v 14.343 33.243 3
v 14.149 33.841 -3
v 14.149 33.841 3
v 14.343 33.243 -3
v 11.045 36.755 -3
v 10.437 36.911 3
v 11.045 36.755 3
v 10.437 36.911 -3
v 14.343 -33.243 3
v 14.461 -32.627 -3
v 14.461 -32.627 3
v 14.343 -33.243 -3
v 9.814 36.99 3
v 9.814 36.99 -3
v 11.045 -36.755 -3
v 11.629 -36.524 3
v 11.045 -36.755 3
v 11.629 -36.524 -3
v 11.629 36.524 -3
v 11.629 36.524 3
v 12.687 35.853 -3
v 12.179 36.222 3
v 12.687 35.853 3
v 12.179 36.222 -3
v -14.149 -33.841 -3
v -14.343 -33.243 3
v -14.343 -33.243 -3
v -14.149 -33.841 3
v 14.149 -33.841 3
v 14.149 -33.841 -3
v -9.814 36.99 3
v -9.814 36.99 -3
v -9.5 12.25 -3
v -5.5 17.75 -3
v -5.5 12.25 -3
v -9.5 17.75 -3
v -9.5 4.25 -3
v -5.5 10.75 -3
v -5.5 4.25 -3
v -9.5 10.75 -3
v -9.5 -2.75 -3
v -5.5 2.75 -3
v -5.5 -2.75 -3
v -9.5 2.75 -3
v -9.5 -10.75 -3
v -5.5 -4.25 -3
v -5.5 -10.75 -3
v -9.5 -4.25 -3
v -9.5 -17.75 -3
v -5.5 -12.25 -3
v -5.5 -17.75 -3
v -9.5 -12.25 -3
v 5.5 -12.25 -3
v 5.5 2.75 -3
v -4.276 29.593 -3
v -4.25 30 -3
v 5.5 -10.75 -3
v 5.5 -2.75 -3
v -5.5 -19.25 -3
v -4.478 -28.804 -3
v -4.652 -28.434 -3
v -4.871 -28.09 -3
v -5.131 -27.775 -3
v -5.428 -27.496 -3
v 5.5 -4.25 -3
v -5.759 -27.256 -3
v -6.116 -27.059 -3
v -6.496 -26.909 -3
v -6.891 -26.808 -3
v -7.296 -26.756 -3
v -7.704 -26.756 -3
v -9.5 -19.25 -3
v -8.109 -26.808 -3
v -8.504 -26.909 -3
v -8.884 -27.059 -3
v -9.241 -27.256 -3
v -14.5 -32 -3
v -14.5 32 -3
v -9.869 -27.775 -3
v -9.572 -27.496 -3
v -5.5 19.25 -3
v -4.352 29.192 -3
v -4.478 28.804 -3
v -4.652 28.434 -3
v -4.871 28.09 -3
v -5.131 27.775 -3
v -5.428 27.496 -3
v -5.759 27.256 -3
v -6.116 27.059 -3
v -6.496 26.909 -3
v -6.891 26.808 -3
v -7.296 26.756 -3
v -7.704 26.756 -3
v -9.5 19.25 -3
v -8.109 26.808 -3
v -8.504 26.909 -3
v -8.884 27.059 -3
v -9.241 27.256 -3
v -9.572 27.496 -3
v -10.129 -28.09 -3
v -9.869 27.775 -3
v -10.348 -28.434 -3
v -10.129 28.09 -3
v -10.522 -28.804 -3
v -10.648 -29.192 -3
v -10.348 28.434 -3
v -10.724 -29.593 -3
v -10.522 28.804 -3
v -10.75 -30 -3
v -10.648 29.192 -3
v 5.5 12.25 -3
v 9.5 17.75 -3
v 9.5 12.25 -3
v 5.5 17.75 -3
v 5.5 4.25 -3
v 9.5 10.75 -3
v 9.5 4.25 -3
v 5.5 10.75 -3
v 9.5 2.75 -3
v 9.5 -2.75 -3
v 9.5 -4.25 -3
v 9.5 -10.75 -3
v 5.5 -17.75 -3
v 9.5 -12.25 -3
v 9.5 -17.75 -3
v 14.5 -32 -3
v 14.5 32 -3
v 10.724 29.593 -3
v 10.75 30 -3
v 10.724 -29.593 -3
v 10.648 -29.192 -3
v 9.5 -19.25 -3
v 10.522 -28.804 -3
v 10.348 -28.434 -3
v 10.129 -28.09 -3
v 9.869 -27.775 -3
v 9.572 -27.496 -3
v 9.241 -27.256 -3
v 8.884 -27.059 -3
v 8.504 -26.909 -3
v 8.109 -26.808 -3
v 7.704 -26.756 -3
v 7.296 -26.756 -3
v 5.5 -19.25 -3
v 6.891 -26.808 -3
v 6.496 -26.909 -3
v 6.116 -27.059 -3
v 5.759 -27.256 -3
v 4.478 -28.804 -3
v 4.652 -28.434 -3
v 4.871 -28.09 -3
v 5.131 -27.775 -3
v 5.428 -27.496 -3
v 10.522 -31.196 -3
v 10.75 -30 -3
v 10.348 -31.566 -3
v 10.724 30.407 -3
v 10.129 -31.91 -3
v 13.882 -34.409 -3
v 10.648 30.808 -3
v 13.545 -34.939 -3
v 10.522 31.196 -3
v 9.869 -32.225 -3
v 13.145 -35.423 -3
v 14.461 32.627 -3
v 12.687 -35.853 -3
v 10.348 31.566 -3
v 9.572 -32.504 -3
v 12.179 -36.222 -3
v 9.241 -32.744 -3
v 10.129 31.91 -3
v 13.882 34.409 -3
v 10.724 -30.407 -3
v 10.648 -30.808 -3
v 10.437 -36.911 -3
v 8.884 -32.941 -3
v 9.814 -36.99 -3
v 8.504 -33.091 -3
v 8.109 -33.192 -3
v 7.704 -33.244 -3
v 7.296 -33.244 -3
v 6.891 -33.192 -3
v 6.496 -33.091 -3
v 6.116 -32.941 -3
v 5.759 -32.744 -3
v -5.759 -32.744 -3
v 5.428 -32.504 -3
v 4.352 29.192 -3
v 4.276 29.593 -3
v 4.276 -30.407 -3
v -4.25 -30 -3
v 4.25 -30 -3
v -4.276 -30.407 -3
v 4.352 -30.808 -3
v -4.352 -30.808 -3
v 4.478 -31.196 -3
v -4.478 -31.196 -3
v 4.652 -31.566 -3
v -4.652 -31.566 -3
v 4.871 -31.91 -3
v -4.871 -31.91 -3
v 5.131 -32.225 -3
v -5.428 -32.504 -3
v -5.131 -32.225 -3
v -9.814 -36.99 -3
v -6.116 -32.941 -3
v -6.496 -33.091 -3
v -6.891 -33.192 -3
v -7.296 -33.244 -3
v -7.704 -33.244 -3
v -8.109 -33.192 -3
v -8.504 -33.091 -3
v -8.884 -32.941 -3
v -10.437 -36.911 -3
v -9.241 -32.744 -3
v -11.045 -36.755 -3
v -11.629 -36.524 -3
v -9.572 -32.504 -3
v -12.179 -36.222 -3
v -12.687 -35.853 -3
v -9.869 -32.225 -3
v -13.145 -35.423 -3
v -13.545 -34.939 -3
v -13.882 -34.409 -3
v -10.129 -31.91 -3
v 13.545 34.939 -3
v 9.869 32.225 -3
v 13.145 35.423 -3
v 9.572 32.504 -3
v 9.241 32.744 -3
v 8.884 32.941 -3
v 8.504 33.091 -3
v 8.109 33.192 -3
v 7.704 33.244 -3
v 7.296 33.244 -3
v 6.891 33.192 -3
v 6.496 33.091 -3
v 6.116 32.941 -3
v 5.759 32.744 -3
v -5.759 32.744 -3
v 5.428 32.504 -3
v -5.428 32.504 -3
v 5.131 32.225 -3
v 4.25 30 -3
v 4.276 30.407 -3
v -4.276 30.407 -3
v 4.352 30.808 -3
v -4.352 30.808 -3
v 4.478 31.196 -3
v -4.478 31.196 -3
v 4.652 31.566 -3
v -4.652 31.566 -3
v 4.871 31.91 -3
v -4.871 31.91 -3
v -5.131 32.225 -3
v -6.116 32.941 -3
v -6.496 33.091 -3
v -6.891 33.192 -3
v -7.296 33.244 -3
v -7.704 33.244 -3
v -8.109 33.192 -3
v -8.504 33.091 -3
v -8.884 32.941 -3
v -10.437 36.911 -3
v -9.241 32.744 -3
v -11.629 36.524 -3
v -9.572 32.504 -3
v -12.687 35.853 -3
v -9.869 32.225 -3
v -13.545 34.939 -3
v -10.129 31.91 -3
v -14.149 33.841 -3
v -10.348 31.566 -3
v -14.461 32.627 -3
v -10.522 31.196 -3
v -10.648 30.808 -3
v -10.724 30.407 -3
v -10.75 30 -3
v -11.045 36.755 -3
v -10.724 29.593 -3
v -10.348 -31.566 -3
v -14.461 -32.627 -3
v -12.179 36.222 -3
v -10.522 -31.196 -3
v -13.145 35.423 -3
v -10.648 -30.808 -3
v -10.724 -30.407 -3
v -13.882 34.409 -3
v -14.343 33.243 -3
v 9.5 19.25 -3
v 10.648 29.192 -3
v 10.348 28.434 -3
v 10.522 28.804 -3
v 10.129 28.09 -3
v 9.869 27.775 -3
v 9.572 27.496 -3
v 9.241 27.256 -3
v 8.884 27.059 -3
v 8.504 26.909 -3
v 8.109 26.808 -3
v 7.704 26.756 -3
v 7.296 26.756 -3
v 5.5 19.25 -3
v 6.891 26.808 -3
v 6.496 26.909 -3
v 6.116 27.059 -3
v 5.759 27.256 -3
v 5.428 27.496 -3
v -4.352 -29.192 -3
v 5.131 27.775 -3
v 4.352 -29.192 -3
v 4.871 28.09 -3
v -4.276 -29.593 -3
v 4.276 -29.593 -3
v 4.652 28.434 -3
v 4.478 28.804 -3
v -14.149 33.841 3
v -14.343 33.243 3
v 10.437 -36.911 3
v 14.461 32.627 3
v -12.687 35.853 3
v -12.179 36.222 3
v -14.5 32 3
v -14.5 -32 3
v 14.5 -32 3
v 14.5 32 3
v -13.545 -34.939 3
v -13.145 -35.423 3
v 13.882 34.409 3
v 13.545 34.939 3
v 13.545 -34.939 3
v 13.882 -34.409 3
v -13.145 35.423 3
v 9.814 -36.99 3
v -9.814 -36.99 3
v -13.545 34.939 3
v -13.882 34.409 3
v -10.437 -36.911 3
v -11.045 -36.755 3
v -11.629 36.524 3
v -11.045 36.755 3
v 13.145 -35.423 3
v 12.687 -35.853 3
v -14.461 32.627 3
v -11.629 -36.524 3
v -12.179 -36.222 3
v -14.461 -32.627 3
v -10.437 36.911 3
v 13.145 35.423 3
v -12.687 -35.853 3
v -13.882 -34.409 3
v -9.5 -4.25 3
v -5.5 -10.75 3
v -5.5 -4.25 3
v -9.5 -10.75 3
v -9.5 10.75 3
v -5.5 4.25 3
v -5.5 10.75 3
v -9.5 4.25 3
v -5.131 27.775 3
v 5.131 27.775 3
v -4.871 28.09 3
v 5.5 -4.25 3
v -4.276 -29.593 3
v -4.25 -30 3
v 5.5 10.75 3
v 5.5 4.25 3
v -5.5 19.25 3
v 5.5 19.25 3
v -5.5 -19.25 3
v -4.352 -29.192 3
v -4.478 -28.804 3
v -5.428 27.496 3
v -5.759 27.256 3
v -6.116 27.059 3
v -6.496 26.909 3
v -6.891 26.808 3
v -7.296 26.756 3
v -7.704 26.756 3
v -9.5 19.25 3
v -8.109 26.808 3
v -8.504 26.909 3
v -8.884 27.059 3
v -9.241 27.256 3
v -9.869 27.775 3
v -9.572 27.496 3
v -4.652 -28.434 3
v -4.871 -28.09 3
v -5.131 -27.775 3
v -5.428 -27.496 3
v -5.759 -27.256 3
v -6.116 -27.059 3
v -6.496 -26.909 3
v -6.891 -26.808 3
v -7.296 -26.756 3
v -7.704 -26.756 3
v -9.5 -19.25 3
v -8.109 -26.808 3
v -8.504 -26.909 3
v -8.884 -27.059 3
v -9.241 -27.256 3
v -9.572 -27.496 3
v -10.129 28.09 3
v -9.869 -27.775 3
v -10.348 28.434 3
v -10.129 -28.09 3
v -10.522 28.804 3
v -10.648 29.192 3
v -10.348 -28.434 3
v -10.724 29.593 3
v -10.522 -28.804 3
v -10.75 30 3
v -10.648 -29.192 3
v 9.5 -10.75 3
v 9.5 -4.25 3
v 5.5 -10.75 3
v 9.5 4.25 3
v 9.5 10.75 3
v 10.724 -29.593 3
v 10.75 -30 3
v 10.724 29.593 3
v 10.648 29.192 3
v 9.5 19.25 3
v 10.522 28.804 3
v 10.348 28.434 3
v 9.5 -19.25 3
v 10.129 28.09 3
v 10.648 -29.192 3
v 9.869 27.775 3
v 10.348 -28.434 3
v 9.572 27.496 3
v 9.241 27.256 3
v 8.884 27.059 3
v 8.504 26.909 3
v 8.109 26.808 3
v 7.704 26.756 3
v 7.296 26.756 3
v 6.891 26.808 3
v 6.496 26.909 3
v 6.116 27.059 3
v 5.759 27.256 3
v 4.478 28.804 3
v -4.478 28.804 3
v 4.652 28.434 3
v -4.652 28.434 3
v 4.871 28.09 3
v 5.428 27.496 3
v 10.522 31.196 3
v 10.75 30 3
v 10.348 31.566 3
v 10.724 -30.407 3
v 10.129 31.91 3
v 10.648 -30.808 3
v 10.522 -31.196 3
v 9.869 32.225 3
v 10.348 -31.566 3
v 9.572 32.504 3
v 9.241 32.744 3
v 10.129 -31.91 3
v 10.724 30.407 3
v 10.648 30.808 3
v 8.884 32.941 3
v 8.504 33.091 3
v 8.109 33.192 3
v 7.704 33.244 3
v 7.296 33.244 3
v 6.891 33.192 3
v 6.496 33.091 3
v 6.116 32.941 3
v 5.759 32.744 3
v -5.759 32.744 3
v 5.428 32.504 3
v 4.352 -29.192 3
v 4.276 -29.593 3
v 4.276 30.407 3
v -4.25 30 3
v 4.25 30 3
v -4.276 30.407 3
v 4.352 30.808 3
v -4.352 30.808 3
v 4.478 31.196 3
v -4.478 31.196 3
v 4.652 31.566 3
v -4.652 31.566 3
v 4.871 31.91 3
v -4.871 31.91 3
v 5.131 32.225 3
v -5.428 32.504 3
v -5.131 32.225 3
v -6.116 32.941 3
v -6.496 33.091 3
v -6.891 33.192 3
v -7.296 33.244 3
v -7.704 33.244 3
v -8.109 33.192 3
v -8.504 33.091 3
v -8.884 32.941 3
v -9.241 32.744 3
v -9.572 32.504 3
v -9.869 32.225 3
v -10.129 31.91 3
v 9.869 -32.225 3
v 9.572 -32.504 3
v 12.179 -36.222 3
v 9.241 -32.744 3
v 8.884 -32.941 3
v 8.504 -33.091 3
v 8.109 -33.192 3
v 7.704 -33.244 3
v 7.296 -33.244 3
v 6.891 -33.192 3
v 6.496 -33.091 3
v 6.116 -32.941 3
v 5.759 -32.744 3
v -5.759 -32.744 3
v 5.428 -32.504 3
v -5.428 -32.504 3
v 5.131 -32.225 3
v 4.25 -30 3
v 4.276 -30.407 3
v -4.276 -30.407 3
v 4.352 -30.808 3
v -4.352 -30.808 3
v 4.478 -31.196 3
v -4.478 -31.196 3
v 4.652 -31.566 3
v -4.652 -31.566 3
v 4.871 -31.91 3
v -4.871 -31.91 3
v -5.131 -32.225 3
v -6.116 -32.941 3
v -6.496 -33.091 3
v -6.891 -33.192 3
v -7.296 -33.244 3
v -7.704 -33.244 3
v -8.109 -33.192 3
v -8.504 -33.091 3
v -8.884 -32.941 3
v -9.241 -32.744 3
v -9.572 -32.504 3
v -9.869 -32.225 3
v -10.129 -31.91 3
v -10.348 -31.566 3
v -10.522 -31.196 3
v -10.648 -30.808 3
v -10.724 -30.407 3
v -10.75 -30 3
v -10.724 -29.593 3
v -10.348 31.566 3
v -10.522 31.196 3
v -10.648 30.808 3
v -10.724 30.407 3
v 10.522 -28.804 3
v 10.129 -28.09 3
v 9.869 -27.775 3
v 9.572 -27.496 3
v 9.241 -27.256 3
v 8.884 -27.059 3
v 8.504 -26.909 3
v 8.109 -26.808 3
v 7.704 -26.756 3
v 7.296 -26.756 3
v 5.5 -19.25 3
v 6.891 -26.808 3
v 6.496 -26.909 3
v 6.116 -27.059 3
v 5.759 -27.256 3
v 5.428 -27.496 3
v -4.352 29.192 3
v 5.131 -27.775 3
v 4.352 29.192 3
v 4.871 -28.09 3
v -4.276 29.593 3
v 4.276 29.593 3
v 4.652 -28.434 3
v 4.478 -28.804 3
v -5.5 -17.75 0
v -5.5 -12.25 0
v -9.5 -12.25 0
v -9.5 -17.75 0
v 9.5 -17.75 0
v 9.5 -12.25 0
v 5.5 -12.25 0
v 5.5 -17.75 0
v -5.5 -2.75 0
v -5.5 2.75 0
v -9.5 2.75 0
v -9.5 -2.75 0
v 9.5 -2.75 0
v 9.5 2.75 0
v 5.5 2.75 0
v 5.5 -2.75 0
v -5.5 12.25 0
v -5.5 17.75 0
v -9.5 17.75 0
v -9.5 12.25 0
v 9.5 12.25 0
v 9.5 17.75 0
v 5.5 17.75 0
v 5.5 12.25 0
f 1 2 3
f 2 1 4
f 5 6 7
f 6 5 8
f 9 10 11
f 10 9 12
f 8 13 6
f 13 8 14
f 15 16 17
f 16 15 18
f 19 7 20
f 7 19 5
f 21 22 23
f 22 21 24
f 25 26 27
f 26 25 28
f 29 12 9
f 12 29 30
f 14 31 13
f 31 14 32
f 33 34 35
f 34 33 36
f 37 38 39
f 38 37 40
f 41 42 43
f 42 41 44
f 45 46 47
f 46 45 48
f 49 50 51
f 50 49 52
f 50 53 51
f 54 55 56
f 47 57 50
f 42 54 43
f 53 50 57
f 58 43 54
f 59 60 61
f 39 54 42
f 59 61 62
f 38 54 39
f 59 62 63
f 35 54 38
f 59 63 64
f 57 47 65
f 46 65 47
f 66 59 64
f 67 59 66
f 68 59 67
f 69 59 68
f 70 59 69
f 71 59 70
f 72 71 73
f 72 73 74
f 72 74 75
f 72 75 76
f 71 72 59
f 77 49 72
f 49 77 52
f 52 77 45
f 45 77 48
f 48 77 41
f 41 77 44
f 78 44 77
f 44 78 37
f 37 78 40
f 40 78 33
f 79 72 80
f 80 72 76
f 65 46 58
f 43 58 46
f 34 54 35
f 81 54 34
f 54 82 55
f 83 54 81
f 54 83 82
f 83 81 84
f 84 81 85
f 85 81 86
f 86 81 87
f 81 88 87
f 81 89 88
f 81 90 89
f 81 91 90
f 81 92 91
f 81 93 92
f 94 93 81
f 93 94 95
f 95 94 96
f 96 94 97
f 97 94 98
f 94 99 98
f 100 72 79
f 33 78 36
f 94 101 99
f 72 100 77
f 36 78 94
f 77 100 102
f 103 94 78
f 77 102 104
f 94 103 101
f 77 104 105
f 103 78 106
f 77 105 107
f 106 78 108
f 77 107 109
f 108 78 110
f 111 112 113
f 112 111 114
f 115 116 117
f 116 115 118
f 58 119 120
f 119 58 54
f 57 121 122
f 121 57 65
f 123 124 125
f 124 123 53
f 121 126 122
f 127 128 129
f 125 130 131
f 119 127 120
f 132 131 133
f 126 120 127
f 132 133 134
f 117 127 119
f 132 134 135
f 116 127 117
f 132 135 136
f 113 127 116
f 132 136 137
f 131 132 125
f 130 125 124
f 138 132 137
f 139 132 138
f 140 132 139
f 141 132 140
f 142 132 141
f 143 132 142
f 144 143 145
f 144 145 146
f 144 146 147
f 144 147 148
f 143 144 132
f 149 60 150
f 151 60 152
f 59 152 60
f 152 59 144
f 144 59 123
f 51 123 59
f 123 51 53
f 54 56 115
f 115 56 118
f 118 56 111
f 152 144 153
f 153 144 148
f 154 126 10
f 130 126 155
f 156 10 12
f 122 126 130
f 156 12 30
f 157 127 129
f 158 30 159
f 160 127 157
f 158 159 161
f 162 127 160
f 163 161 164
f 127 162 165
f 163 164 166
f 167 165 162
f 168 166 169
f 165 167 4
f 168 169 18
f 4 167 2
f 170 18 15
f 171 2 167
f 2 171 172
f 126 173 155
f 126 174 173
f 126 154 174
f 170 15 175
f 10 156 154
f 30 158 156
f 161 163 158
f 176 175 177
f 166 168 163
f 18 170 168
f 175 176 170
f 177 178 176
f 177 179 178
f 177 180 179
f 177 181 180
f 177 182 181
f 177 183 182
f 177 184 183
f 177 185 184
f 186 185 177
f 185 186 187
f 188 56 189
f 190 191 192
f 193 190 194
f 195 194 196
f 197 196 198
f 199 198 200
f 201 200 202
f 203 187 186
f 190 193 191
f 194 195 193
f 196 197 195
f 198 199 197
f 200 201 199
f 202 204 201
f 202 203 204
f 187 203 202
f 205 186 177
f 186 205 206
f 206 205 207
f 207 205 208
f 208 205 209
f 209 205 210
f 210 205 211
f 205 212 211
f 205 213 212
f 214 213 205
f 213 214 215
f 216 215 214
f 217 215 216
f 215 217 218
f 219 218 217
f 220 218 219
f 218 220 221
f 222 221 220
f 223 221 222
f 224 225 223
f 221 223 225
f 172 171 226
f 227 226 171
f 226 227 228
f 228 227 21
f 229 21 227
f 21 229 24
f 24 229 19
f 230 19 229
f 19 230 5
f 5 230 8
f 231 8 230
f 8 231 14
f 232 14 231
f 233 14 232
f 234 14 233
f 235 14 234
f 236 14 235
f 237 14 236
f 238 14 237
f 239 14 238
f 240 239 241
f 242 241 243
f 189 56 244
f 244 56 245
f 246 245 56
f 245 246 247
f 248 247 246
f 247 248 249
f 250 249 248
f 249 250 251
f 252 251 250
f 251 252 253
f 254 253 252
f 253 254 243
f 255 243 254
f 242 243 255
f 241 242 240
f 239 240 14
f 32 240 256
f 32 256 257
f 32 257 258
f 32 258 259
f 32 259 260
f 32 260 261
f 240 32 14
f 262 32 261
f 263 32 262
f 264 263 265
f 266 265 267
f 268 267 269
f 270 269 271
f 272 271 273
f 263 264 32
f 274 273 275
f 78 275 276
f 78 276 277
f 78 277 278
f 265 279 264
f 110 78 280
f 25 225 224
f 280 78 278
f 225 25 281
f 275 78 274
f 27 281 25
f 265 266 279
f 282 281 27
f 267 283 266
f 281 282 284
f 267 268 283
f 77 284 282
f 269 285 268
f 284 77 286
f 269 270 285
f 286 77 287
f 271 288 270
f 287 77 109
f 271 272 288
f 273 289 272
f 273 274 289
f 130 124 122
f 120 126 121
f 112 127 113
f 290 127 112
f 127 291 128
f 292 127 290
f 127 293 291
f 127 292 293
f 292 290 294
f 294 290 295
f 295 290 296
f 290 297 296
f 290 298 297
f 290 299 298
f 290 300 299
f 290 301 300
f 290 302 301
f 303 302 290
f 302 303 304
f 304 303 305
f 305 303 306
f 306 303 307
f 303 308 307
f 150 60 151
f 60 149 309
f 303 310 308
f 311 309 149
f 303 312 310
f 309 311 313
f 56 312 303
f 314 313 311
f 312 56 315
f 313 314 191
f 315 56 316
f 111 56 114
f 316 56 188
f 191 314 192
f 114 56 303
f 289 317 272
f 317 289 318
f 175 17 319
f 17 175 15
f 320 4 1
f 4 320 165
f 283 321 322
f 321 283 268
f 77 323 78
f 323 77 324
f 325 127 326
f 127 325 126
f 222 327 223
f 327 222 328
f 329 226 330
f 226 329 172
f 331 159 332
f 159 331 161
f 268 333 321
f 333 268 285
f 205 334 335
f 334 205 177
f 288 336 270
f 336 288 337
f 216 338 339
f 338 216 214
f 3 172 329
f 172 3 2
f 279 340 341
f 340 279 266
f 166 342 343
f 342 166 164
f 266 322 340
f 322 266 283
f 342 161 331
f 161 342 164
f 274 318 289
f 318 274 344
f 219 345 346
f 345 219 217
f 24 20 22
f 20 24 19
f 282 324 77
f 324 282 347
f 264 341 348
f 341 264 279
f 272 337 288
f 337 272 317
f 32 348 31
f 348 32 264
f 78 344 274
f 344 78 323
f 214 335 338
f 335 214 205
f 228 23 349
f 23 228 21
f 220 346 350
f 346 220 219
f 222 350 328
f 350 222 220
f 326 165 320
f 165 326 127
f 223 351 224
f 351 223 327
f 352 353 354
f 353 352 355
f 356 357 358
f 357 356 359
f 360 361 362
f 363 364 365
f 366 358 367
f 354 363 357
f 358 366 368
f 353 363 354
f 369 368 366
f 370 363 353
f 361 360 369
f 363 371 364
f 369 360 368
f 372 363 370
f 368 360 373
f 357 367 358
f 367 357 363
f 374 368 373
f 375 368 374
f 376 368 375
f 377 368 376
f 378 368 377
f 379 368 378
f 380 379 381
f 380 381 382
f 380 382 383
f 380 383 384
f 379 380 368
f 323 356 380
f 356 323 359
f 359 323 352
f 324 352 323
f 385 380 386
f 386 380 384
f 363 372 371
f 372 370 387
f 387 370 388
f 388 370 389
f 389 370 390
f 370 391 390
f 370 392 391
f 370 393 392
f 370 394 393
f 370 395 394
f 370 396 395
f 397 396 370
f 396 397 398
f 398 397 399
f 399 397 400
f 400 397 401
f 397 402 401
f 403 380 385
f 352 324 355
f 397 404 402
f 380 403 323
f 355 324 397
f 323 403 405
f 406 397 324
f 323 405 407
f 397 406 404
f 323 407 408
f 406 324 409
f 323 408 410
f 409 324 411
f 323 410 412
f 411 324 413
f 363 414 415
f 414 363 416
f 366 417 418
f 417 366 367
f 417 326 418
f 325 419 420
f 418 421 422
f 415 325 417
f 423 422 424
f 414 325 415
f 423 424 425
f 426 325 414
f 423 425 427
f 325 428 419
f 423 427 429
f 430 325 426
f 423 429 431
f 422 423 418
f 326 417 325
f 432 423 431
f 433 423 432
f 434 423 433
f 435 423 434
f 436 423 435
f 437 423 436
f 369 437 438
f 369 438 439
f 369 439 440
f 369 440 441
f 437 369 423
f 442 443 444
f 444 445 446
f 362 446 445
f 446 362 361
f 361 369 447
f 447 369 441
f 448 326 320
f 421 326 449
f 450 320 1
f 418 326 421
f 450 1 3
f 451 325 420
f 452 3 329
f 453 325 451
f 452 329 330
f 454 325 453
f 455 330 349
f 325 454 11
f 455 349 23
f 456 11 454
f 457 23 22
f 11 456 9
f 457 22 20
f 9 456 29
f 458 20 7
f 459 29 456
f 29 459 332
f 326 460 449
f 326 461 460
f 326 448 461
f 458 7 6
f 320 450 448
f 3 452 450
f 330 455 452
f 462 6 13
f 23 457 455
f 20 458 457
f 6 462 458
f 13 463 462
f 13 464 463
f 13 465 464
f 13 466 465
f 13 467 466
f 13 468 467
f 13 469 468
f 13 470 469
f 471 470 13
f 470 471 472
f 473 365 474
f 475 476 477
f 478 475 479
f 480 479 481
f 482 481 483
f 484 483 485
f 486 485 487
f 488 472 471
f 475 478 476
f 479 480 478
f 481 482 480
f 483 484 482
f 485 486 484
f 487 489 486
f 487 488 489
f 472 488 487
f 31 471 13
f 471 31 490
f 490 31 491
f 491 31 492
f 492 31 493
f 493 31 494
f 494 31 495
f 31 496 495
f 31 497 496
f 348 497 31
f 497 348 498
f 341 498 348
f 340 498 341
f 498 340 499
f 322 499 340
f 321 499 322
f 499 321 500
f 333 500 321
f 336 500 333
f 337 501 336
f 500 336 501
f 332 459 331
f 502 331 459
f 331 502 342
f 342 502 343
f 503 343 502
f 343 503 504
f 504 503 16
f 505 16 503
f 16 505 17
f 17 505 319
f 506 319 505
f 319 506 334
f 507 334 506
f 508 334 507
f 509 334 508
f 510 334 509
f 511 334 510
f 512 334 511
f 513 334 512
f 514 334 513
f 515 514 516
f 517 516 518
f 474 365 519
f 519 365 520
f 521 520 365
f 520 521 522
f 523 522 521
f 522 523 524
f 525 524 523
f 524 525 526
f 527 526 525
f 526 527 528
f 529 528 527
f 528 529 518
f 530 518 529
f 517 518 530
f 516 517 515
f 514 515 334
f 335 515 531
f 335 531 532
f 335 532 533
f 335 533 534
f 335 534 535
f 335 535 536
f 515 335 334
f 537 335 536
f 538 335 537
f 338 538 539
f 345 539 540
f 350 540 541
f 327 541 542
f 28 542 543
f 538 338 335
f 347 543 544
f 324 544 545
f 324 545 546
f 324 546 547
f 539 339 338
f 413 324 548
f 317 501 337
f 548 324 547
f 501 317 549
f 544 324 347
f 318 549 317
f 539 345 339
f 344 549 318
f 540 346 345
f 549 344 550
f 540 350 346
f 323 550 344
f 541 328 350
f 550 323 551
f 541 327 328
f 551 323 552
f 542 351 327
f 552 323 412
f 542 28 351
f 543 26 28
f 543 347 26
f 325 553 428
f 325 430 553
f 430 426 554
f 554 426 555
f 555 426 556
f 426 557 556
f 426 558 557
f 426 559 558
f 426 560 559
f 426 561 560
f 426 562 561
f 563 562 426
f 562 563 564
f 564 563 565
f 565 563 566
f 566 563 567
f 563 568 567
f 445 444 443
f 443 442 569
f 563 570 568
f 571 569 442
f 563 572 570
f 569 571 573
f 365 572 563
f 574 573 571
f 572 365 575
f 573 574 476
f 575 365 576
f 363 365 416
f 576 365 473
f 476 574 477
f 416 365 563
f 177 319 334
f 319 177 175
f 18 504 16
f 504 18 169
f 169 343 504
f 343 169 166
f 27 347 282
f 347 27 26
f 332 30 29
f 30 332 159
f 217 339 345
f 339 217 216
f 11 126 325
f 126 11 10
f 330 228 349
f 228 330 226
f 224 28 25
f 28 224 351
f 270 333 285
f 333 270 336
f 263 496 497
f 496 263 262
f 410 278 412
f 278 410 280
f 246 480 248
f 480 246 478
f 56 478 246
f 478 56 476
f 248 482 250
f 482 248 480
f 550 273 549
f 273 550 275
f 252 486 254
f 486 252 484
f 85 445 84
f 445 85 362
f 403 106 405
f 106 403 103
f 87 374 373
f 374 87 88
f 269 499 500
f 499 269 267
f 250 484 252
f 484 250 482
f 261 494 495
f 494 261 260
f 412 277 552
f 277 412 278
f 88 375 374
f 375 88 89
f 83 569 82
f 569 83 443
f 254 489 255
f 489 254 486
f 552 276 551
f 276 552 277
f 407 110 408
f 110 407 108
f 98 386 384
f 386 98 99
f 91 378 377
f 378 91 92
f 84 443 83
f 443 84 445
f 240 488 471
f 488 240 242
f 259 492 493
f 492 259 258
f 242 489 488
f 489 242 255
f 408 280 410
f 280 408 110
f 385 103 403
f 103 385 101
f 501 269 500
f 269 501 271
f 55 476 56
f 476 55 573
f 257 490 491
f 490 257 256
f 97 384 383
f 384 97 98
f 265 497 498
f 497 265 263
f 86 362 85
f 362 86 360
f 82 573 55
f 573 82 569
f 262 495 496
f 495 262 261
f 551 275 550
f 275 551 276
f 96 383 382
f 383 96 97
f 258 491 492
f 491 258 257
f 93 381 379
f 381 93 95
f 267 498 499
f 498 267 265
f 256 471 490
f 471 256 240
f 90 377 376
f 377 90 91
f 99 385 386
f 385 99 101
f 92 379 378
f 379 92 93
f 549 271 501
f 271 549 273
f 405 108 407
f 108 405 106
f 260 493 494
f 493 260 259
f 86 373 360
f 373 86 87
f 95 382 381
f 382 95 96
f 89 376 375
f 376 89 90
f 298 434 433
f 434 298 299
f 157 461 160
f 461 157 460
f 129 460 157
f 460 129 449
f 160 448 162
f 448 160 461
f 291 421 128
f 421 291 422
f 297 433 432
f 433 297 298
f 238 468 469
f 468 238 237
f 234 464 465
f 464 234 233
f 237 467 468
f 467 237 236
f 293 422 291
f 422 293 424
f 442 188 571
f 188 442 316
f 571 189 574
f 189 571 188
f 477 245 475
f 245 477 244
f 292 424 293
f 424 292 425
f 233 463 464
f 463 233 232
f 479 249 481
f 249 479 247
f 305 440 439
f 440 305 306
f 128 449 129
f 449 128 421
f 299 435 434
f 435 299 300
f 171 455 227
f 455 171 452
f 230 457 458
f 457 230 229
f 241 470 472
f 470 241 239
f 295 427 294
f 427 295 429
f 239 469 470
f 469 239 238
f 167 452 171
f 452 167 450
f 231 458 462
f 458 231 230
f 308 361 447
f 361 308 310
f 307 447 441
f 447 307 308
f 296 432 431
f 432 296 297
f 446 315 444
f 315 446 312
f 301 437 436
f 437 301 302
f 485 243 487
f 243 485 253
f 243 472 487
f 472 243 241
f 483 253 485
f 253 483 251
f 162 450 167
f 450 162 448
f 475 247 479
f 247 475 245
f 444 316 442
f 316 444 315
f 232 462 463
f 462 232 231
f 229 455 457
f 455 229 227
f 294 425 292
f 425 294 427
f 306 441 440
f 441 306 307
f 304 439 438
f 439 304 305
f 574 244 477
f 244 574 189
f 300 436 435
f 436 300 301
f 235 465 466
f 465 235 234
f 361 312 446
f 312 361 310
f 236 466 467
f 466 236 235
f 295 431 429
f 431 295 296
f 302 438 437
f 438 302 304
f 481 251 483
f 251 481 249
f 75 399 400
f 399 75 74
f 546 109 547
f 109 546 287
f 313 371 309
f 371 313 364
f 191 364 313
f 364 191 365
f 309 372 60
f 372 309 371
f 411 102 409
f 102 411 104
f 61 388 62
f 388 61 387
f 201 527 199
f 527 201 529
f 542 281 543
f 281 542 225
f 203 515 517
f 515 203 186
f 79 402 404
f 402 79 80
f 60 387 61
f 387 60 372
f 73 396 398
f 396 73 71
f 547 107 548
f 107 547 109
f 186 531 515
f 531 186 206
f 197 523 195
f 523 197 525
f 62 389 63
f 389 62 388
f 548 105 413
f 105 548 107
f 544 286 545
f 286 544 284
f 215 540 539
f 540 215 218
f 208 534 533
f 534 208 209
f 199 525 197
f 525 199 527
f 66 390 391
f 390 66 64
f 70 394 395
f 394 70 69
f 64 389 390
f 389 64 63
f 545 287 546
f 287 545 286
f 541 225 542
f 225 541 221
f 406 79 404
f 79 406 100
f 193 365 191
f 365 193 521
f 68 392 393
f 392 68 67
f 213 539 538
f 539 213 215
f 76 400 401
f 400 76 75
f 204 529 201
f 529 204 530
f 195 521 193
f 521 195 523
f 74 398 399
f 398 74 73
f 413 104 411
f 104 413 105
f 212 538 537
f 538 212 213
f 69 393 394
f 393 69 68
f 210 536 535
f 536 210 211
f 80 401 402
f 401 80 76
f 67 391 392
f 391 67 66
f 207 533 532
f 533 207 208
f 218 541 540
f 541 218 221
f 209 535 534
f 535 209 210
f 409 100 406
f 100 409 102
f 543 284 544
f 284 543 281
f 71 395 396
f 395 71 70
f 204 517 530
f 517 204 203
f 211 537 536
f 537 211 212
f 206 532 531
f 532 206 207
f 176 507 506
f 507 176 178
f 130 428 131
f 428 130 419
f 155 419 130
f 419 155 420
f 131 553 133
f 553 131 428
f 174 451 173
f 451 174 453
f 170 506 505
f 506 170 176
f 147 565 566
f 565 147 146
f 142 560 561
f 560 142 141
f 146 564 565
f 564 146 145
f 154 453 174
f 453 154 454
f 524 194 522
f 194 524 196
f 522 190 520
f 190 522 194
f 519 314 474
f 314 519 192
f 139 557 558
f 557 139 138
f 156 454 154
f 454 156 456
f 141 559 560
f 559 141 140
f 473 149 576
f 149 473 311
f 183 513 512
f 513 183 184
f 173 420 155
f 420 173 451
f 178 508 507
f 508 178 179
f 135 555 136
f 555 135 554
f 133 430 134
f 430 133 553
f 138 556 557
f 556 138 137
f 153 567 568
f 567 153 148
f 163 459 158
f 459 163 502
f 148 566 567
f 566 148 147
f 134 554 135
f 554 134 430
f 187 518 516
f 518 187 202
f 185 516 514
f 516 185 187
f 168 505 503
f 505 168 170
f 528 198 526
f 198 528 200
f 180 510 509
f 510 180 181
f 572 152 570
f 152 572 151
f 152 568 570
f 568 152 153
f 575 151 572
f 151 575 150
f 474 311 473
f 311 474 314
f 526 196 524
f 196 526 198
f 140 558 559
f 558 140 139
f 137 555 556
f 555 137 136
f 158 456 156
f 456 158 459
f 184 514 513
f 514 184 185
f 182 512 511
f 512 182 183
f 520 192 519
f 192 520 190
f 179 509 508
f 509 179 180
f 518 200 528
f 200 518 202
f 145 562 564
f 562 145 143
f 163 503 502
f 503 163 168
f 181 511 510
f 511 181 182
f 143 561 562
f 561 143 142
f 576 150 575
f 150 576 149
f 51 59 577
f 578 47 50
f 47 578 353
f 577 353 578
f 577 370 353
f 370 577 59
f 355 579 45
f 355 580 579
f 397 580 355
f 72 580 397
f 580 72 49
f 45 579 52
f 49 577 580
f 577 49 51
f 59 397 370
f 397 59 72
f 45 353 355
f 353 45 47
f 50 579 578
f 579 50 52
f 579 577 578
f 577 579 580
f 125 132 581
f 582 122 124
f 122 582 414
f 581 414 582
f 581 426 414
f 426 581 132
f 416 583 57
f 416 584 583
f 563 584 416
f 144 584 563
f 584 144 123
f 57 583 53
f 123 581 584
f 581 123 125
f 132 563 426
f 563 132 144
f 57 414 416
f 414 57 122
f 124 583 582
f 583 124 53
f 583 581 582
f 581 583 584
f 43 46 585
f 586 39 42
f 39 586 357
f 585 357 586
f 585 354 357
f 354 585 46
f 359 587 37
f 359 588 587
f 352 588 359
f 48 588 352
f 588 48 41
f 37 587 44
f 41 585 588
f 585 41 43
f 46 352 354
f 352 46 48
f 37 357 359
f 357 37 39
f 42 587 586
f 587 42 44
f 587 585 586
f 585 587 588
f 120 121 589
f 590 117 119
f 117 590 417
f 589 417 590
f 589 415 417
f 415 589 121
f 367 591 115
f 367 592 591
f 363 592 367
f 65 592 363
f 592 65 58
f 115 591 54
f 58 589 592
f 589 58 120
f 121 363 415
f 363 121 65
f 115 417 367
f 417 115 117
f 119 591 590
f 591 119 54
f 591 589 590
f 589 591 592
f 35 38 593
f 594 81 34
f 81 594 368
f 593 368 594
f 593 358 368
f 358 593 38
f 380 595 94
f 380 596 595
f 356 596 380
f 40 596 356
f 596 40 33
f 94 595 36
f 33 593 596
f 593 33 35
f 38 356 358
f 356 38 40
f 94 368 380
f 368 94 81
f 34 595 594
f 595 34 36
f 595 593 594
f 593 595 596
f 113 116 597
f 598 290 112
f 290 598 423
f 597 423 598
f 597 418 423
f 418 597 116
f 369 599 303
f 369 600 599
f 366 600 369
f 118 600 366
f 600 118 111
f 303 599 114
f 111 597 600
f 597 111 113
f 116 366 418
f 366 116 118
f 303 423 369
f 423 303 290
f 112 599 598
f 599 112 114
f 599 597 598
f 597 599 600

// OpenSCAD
$fn = 50;


difference() {
	union() {
		translate(v = [0, 0, -3.0000000000]) {
			hull() {
				translate(v = [-9.5000000000, 32.0000000000, 0]) {
					cylinder(h = 6, r = 5);
				}
				translate(v = [9.5000000000, 32.0000000000, 0]) {
					cylinder(h = 6, r = 5);
				}
				translate(v = [-9.5000000000, -32.0000000000, 0]) {
					cylinder(h = 6, r = 5);
				}
				translate(v = [9.5000000000, -32.0000000000, 0]) {
					cylinder(h = 6, r = 5);
				}
			}
		}
		translate(v = [0, 0, -3.0000000000]) {
			hull() {
				translate(v = [-9.5000000000, 32.0000000000, 0]) {
					cylinder(h = 6, r = 5);
				}
				translate(v = [9.5000000000, 32.0000000000, 0]) {
					cylinder(h = 6, r = 5);
				}
				translate(v = [-9.5000000000, -32.0000000000, 0]) {
					cylinder(h = 6, r = 5);
				}
				translate(v = [9.5000000000, -32.0000000000, 0]) {
					cylinder(h = 6, r = 5);
				}
			}
		}
	}
	union() {
		translate(v = [-7.5000000000, 30.0000000000, -50.0000000000]) {
			cylinder(h = 100, r = 3.2500000000);
		}
		translate(v = [7.5000000000, 30.0000000000, -50.0000000000]) {
			cylinder(h = 100, r = 3.2500000000);
		}
		translate(v = [-7.5000000000, -30.0000000000, -50.0000000000]) {
			cylinder(h = 100, r = 3.2500000000);
		}
		translate(v = [7.5000000000, -30.0000000000, -50.0000000000]) {
			cylinder(h = 100, r = 3.2500000000);
		}
		translate(v = [-9.5000000000, -19.2500000000, -50]) {
			cube(size = [4, 1.5000000000, 100]);
		}
		translate(v = [-9.5000000000, -12.2500000000, -50]) {
			cube(size = [4, 1.5000000000, 100]);
		}
		translate(v = [-9.5000000000, -19.2500000000, 0]) {
			cube(size = [4, 8.5000000000, 3]);
		}
		translate(v = [5.5000000000, -19.2500000000, -50]) {
			cube(size = [4, 1.5000000000, 100]);
		}
		translate(v = [5.5000000000, -12.2500000000, -50]) {
			cube(size = [4, 1.5000000000, 100]);
		}
		translate(v = [5.5000000000, -19.2500000000, 0]) {
			cube(size = [4, 8.5000000000, 3]);
		}
		translate(v = [-9.5000000000, -4.2500000000, -50]) {
			cube(size = [4, 1.5000000000, 100]);
		}
		translate(v = [-9.5000000000, 2.7500000000, -50]) {
			cube(size = [4, 1.5000000000, 100]);
		}
		translate(v = [-9.5000000000, -4.2500000000, 0]) {
			cube(size = [4, 8.5000000000, 3]);
		}
		translate(v = [5.5000000000, -4.2500000000, -50]) {
			cube(size = [4, 1.5000000000, 100]);
		}
		translate(v = [5.5000000000, 2.7500000000, -50]) {
			cube(size = [4, 1.5000000000, 100]);
		}
		translate(v = [5.5000000000, -4.2500000000, 0]) {
			cube(size = [4, 8.5000000000, 3]);
		}
		translate(v = [-9.5000000000, 10.7500000000, -50]) {
			cube(size = [4, 1.5000000000, 100]);
		}
		translate(v = [-9.5000000000, 17.7500000000, -50]) {
			cube(size = [4, 1.5000000000, 100]);
		}
		translate(v = [-9.5000000000, 10.7500000000, 0]) {
			cube(size = [4, 8.5000000000, 3]);
		}
		translate(v = [5.5000000000, 10.7500000000, -50]) {
			cube(size = [4, 1.5000000000, 100]);
		}
		translate(v = [5.5000000000, 17.7500000000, -50]) {
			cube(size = [4, 1.5000000000, 100]);
		}
		translate(v = [5.5000000000, 10.7500000000, 0]) {
			cube(size = [4, 8.5000000000, 3]);
		}
	}
}
